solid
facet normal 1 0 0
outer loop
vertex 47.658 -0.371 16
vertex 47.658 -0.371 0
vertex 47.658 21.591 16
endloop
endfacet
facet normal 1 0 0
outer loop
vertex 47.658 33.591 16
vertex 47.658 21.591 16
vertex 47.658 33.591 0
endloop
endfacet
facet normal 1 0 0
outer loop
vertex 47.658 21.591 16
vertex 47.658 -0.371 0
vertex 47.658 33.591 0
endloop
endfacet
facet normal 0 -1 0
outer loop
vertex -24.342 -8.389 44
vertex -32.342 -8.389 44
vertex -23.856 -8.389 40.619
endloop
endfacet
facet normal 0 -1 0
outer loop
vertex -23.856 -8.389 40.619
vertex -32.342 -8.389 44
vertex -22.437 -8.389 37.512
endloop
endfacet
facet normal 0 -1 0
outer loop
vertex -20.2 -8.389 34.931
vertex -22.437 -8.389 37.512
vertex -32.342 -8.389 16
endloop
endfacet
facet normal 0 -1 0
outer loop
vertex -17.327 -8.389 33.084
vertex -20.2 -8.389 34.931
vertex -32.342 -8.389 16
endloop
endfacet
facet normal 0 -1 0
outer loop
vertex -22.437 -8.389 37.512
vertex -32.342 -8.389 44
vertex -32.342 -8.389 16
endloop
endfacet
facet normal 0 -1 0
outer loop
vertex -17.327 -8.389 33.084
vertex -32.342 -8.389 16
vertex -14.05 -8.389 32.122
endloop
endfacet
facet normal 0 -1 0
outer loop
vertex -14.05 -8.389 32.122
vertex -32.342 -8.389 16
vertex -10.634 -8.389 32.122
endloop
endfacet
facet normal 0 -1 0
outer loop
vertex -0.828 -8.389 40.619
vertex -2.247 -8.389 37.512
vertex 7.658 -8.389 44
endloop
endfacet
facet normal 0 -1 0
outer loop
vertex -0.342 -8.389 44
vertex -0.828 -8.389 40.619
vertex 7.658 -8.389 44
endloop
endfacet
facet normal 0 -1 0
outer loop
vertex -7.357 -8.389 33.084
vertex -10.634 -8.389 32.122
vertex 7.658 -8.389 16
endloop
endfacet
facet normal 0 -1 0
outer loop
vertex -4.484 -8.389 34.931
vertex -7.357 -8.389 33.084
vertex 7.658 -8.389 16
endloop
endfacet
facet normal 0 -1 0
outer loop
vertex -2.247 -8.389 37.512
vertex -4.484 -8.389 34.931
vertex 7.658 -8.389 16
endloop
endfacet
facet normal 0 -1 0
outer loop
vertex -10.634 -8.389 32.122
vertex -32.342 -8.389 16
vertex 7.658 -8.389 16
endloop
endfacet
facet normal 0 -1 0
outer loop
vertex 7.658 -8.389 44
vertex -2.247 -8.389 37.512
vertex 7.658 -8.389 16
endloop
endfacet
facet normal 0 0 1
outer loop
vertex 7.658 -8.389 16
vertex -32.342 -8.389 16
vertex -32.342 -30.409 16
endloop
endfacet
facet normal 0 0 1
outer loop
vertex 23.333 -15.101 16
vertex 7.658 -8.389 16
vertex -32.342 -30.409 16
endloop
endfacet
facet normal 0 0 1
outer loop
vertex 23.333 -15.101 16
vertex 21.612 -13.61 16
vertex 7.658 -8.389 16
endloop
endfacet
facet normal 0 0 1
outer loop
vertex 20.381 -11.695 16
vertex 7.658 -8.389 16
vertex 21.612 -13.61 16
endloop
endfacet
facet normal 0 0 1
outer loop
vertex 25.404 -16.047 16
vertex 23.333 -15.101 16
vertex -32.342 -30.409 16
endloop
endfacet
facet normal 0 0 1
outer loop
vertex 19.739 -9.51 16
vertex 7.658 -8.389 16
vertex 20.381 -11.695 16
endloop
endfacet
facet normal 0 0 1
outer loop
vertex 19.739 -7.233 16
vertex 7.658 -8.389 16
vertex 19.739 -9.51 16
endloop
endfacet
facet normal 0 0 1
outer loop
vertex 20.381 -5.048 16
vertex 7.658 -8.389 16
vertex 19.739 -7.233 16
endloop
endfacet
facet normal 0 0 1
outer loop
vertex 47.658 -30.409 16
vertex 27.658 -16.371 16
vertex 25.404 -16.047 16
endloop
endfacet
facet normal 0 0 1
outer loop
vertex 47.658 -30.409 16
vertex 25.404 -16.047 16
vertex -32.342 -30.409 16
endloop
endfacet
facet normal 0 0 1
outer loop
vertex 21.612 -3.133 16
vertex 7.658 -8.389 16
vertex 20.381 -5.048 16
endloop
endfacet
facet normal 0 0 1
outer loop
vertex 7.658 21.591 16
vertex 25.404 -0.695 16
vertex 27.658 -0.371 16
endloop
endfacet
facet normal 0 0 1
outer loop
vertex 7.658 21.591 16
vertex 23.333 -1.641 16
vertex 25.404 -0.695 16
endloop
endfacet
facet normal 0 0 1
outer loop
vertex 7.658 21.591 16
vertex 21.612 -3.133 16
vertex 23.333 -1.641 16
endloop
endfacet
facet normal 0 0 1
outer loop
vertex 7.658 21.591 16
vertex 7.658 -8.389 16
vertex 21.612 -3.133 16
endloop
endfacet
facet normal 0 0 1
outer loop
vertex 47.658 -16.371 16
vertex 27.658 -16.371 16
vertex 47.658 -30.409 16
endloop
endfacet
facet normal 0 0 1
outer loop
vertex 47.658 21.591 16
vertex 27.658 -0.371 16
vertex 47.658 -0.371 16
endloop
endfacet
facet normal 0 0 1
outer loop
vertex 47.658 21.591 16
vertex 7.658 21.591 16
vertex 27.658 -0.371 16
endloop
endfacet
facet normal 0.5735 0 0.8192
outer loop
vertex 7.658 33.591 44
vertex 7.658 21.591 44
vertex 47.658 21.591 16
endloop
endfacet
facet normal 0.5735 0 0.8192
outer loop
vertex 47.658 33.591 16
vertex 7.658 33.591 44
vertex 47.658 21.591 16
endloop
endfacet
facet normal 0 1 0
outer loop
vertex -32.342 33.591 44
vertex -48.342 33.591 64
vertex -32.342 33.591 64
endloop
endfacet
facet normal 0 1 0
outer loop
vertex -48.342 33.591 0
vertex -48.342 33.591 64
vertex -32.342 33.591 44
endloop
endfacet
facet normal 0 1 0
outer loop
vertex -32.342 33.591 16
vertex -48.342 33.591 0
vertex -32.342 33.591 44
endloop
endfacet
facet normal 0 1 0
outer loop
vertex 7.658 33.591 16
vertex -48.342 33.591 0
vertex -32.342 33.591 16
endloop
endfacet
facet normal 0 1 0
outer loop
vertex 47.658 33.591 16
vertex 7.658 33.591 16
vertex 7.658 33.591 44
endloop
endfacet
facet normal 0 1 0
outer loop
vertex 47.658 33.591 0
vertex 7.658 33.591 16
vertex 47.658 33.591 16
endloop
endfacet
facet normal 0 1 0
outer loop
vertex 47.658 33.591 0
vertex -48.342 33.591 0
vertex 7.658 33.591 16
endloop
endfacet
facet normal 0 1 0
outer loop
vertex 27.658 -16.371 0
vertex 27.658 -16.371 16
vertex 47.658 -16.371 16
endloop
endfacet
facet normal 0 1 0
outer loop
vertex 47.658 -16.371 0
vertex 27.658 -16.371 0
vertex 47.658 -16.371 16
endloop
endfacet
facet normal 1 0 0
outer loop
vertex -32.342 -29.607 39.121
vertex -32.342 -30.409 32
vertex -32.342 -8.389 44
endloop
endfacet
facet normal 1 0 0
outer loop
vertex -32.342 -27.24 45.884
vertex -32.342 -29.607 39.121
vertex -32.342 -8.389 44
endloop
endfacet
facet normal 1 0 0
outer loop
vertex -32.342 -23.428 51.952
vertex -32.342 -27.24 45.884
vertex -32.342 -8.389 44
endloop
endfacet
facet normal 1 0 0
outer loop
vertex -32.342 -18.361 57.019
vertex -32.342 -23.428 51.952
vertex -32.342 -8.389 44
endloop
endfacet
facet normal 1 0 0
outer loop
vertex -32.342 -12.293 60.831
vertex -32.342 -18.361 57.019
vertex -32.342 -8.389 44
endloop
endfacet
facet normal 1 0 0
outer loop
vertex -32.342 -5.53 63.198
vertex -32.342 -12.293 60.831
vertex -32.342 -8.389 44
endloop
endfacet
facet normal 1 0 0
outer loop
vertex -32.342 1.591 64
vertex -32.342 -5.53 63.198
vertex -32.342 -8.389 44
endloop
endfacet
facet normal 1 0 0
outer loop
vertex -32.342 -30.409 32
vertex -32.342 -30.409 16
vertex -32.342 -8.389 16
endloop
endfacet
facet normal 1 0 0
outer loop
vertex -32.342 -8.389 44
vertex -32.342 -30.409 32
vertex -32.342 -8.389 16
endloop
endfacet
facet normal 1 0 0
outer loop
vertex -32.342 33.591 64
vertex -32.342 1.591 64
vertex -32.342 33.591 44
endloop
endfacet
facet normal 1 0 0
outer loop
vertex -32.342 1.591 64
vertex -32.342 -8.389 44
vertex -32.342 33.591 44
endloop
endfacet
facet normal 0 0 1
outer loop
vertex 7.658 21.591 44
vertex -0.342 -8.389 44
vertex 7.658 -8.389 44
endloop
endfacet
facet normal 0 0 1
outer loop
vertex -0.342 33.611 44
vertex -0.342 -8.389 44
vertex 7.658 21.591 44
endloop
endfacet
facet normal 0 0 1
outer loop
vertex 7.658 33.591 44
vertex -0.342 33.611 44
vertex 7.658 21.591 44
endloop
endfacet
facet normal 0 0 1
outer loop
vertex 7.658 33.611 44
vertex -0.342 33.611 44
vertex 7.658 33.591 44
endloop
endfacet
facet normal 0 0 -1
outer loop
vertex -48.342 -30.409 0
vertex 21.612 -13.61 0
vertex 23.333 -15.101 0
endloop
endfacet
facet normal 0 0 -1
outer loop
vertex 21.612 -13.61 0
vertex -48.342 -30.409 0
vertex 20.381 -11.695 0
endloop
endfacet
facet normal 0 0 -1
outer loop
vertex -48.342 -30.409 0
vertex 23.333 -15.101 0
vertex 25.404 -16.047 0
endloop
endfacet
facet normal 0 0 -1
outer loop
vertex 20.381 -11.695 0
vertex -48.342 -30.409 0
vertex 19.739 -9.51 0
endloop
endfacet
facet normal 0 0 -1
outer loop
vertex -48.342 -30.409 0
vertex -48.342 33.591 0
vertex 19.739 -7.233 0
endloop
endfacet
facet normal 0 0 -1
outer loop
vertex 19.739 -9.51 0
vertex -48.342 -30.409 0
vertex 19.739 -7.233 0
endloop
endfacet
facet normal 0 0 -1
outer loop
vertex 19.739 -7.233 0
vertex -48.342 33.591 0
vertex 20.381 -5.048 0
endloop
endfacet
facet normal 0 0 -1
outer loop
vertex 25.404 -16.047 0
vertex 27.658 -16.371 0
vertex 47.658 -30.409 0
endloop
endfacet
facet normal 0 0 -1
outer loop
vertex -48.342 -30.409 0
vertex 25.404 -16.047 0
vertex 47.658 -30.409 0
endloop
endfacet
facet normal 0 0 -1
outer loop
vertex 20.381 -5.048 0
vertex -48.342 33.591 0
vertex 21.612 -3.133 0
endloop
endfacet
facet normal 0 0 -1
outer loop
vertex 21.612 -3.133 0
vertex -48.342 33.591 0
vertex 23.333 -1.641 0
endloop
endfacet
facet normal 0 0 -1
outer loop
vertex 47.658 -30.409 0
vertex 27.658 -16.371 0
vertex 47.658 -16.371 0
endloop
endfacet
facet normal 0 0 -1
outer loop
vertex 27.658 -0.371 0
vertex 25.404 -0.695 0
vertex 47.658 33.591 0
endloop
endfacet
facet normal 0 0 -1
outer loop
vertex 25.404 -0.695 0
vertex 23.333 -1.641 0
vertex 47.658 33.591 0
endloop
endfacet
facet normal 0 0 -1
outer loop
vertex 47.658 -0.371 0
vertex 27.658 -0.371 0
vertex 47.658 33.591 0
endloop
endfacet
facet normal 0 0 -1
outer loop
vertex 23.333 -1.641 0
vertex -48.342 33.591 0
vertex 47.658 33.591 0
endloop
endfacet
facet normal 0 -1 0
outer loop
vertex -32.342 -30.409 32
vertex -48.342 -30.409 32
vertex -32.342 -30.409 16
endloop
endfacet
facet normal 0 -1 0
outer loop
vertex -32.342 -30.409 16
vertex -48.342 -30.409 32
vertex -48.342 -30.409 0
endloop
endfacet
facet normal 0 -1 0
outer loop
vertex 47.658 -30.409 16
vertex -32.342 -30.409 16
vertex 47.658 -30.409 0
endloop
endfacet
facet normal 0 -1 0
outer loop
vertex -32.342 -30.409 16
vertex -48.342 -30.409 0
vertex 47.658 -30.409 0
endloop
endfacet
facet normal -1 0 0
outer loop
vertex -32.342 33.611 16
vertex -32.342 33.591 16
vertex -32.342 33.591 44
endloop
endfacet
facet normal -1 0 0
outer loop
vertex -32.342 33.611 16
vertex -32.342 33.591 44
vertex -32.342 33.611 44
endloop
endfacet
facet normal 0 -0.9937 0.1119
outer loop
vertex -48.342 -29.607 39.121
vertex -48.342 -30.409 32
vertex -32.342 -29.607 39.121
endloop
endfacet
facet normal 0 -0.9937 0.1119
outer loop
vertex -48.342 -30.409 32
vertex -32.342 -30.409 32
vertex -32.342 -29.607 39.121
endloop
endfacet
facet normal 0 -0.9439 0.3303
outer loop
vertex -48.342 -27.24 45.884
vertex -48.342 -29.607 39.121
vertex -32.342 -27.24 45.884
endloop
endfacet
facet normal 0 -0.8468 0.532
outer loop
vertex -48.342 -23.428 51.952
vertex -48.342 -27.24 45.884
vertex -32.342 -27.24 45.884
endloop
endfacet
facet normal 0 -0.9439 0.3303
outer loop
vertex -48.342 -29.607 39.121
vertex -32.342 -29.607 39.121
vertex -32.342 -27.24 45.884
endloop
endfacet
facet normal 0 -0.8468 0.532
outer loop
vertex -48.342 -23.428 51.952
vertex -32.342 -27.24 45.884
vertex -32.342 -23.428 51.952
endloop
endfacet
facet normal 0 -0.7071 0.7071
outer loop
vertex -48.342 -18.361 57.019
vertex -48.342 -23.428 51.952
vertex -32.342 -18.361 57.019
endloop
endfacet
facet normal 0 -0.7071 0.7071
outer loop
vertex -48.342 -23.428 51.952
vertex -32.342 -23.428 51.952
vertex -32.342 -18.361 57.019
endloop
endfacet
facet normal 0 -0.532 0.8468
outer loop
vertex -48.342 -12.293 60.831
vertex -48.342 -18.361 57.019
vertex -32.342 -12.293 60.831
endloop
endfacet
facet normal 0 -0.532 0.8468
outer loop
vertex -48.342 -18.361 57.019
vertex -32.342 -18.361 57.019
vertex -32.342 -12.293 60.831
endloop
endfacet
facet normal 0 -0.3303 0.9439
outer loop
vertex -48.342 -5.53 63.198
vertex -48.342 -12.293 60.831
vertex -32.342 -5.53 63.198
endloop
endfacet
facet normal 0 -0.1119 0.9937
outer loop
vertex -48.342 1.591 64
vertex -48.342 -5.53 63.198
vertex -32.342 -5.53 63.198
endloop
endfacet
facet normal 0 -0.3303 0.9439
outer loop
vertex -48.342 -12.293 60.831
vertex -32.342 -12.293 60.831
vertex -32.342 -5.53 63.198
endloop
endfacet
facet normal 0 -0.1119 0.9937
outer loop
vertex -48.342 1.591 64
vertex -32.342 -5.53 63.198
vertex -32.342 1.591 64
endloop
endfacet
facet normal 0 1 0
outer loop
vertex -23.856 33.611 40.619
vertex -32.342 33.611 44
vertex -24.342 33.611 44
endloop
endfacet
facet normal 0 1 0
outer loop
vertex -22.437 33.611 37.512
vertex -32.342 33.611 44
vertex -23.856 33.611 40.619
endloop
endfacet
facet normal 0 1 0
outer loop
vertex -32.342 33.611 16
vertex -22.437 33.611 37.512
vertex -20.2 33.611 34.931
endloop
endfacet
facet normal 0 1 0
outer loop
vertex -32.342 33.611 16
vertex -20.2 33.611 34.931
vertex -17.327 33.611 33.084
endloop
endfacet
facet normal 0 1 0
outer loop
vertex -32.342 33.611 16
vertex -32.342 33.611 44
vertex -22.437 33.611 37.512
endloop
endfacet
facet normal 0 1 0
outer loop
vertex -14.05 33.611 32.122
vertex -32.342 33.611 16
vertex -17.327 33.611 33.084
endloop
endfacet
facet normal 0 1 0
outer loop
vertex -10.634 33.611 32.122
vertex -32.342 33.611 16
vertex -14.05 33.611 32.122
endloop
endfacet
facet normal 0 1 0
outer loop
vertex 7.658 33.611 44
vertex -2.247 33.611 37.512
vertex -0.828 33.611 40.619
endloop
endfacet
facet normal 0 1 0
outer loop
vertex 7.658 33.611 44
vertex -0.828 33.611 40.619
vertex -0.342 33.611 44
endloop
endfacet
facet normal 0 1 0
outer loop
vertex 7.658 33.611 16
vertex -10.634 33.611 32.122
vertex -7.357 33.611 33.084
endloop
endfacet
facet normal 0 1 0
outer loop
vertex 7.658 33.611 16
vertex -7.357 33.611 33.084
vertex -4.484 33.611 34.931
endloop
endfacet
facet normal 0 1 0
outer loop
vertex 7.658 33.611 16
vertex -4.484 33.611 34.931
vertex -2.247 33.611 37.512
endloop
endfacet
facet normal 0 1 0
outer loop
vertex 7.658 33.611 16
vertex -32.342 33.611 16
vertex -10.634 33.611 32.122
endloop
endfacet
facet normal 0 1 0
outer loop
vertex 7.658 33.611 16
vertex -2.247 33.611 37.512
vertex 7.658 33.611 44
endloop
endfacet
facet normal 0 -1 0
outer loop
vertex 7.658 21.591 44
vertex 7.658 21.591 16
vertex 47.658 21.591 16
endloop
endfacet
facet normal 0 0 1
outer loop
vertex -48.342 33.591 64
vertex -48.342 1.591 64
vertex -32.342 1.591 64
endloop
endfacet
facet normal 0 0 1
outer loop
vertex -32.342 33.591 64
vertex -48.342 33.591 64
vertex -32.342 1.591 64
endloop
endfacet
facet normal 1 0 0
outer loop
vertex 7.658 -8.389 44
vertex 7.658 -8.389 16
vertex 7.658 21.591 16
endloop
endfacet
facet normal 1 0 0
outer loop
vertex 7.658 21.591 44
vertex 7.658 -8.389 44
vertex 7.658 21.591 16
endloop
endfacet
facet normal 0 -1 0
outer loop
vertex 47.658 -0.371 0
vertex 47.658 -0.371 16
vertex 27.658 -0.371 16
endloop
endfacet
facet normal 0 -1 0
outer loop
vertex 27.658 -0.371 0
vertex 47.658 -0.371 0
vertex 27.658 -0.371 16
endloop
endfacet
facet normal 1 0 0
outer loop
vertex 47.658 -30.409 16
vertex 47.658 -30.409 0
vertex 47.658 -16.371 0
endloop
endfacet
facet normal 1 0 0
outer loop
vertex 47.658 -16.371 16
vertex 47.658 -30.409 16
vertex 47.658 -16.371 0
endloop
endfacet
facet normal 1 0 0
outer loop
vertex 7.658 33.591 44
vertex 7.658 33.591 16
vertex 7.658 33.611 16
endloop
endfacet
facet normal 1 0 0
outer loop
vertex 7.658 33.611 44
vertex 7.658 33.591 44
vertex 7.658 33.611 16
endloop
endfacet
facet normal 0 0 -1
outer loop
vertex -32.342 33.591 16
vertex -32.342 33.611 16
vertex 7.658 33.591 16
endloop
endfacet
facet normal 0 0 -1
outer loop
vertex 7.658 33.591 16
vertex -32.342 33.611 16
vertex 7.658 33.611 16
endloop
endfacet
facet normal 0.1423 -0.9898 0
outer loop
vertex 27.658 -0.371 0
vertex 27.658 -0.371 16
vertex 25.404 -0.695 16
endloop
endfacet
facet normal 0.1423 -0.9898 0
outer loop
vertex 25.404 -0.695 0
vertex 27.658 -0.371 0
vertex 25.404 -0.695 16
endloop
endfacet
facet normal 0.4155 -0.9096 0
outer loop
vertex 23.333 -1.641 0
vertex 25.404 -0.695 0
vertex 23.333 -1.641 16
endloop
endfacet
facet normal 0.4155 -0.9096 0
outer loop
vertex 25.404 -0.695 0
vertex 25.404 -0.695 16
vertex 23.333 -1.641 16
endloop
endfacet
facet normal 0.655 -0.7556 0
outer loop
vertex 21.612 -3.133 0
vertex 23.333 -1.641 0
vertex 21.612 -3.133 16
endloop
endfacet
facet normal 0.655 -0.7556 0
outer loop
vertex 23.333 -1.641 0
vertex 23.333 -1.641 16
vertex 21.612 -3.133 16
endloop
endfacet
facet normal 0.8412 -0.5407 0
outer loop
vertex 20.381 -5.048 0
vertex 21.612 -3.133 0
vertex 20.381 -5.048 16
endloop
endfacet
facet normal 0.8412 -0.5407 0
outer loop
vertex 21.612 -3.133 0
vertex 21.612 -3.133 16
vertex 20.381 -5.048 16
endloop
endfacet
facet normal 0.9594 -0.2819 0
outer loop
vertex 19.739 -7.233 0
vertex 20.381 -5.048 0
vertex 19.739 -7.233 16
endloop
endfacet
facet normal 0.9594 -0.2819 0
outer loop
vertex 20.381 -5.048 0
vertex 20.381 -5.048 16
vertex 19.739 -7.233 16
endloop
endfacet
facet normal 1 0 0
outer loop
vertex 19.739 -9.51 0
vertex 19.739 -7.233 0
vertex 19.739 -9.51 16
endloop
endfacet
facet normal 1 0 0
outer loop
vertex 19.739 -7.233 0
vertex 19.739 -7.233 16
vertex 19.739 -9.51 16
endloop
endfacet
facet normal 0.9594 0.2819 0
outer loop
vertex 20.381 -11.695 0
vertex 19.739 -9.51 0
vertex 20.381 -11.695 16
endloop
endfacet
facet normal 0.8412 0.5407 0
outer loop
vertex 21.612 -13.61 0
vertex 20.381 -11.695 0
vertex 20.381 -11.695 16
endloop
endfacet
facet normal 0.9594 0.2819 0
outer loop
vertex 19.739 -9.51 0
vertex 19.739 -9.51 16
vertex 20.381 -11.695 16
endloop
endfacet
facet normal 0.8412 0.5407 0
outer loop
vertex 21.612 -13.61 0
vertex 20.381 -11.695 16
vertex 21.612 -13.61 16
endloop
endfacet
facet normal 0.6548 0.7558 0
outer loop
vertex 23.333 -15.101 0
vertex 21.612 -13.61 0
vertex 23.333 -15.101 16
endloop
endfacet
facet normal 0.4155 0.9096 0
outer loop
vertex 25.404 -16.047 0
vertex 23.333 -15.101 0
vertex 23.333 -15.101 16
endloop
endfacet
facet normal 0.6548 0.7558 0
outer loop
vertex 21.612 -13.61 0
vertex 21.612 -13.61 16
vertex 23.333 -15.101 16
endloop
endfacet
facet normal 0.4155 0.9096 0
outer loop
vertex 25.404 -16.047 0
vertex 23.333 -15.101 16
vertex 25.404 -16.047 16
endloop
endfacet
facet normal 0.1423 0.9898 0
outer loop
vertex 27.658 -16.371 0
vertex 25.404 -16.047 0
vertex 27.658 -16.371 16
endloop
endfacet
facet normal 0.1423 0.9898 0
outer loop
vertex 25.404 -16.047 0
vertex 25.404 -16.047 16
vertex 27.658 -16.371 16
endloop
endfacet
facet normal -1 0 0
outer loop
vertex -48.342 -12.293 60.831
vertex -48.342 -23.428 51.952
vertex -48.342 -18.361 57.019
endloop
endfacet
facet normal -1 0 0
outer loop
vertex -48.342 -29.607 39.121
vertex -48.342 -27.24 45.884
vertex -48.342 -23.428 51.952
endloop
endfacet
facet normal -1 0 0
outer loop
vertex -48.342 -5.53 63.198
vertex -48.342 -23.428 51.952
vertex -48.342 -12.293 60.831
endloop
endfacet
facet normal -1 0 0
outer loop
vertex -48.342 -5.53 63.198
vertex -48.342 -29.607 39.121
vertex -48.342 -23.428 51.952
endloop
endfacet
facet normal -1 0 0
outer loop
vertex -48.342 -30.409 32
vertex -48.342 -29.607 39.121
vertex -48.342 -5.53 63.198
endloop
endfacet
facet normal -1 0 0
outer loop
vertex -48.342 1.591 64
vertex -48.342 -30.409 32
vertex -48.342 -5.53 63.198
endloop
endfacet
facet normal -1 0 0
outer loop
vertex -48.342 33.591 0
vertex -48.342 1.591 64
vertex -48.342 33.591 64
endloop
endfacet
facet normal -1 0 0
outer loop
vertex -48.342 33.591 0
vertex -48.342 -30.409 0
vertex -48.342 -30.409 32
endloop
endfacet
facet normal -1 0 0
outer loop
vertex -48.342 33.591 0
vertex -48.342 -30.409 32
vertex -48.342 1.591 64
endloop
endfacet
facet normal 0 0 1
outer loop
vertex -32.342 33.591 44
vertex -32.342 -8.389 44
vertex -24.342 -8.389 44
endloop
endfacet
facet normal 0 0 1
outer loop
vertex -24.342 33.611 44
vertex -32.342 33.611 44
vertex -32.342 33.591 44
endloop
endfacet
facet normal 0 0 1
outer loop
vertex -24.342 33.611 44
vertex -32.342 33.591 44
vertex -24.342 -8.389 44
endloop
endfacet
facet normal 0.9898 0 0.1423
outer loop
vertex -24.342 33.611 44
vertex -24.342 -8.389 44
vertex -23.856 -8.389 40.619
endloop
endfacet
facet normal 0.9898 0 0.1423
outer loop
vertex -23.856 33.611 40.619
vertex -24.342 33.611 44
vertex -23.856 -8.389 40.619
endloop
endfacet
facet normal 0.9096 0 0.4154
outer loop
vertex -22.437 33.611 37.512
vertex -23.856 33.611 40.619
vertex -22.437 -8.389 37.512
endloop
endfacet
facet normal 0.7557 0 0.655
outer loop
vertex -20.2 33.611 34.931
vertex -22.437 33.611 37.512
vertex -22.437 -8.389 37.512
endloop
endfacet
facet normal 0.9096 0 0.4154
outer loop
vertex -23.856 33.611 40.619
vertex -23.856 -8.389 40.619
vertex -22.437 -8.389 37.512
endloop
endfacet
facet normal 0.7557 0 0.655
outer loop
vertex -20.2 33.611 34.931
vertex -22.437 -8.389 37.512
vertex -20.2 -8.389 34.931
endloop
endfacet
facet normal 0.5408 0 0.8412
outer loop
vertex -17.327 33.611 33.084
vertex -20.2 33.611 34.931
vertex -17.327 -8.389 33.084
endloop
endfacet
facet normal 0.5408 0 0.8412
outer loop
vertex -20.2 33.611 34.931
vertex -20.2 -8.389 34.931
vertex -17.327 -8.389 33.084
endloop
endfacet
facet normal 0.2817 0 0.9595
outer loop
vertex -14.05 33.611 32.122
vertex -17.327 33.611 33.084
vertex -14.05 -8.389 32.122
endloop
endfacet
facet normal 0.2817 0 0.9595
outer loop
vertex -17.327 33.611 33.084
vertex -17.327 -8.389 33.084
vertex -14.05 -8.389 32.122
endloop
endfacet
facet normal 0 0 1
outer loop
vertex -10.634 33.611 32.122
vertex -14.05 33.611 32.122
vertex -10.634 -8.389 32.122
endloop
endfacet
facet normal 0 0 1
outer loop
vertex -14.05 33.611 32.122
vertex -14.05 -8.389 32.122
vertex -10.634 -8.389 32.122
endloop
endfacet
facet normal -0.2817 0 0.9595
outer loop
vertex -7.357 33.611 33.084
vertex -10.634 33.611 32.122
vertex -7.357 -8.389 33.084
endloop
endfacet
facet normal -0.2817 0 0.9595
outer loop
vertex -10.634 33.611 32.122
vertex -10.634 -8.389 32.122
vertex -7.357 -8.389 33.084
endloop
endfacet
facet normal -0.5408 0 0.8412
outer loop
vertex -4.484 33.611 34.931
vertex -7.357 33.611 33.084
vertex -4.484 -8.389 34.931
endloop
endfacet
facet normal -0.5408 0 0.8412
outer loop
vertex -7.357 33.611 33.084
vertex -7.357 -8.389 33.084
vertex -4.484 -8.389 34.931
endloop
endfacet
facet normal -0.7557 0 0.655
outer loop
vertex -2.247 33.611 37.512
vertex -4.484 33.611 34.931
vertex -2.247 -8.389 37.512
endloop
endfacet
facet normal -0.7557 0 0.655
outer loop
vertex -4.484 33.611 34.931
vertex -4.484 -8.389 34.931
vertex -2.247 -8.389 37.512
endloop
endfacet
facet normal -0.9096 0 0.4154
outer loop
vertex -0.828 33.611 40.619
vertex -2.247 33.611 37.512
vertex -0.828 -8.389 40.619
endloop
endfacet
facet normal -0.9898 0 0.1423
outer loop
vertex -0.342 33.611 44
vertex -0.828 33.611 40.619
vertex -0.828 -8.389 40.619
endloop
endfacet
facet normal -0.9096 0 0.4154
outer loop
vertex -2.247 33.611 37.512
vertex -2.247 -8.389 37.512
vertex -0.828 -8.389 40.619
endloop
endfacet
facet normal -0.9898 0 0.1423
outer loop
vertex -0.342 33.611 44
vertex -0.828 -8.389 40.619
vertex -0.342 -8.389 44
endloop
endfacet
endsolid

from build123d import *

# Parameters (mm, degrees)
F0_W      = 96
F0_H      = 64
F1_DEPTH  = 16
F2_W      = 16
F2_H      = 64
F3_DEPTH  = 48
F4_R      = 32
F5_W      = 40
F5_H      = 42
F6_DEPTH  = 28
F7_W      = 40
F7_H      = 12
F8_DEPTH  = 28
F10_DEPTH = 25.4
F11_R     = 12
F12_DEPTH = 63.246
F14_DEPTH = 25.4


with BuildPart() as f1:
    # F0 (on Top) → F1 (new body)
    with BuildSketch(Plane.XY):
        with Locations((-0.3420451991, 1.5907883644)):
            Rectangle(F0_W, F0_H)
    extrude(amount=F1_DEPTH)

    # F2 (on face) → F3 (join)
    with BuildSketch(Plane.XY.offset(16)):
        with Locations((-40.3420451991, 1.5907883644)):
            Rectangle(F2_W, F2_H)
    extrude(amount=F3_DEPTH)

    # F4
    f4_edges = [f1.edges().sort_by_distance(p)[0] for p in [
        (-40.342045, -30.409212, 64),
    ]]
    fillet(f4_edges, radius=F4_R)

    # F5 (on face) → F6 (join)
    with BuildSketch(Plane.XY.offset(16)):
        with Locations((-12.3420451991, 12.61113044)):
            Rectangle(F5_W, F5_H)
    extrude(amount=F6_DEPTH)

    # F7 (on face) → F8 (join)
    with BuildSketch(Plane.XY.offset(16)):
        with Locations((27.6579548009, 27.5907883644)):
            Rectangle(F7_W, F7_H)
    extrude(amount=F8_DEPTH)

    # F9 (on face) → F10 (cut)
    with BuildSketch(Plane.XZ.offset(-21.5907883644)):
        Polygon((47.6579548009, 44), (7.6579548009, 44), (47.6579548009, 16), align=None)
    extrude(amount=-F10_DEPTH, mode=Mode.SUBTRACT)

    # F11 (on face) → F12 (cut)
    with BuildSketch(Plane.XZ.offset(8.38886956)):
        with Locations((-12.3420451991, 44)):
            Circle(F11_R)
    extrude(amount=-F12_DEPTH, mode=Mode.SUBTRACT)

    # F13 (on face) → F14 (cut)
    with BuildSketch(Plane.XY.offset(16)):
        with BuildLine():
            ThreePointArc((35.6579548009, -8.3714298824), (33.3148090504, -2.714575633), (27.6579548009, -0.3714298824))
            Line((27.6579548009, -0.3714298824), (27.6579548009, -16.3714298824))
            ThreePointArc((27.6579548009, -16.3714298824), (33.3148090504, -14.0282841319), (35.6579548009, -8.3714298824))
        make_face()
        with BuildLine():
            Line((47.6579548009, -0.3714298824), (27.6579548009, -0.3714298824))
            ThreePointArc((27.6579548009, -0.3714298824), (33.3148090504, -2.714575633), (35.6579548009, -8.3714298824))
            ThreePointArc((35.6579548009, -8.3714298824), (33.3148090504, -14.0282841319), (27.6579548009, -16.3714298824))
            Line((27.6579548009, -16.3714298824), (47.6579548009, -16.3714298824))
            Line((47.6579548009, -16.3714298824), (47.6579548009, -0.3714298824))
        make_face()
        with BuildLine():
            Line((27.6579548009, -16.3714298824), (27.6579548009, -0.3714298824))
            ThreePointArc((27.6579548009, -0.3714298824), (19.6579548009, -8.3714298824), (27.6579548009, -16.3714298824))
        make_face()
    extrude(amount=-F14_DEPTH, mode=Mode.SUBTRACT)


solid = f1.part
